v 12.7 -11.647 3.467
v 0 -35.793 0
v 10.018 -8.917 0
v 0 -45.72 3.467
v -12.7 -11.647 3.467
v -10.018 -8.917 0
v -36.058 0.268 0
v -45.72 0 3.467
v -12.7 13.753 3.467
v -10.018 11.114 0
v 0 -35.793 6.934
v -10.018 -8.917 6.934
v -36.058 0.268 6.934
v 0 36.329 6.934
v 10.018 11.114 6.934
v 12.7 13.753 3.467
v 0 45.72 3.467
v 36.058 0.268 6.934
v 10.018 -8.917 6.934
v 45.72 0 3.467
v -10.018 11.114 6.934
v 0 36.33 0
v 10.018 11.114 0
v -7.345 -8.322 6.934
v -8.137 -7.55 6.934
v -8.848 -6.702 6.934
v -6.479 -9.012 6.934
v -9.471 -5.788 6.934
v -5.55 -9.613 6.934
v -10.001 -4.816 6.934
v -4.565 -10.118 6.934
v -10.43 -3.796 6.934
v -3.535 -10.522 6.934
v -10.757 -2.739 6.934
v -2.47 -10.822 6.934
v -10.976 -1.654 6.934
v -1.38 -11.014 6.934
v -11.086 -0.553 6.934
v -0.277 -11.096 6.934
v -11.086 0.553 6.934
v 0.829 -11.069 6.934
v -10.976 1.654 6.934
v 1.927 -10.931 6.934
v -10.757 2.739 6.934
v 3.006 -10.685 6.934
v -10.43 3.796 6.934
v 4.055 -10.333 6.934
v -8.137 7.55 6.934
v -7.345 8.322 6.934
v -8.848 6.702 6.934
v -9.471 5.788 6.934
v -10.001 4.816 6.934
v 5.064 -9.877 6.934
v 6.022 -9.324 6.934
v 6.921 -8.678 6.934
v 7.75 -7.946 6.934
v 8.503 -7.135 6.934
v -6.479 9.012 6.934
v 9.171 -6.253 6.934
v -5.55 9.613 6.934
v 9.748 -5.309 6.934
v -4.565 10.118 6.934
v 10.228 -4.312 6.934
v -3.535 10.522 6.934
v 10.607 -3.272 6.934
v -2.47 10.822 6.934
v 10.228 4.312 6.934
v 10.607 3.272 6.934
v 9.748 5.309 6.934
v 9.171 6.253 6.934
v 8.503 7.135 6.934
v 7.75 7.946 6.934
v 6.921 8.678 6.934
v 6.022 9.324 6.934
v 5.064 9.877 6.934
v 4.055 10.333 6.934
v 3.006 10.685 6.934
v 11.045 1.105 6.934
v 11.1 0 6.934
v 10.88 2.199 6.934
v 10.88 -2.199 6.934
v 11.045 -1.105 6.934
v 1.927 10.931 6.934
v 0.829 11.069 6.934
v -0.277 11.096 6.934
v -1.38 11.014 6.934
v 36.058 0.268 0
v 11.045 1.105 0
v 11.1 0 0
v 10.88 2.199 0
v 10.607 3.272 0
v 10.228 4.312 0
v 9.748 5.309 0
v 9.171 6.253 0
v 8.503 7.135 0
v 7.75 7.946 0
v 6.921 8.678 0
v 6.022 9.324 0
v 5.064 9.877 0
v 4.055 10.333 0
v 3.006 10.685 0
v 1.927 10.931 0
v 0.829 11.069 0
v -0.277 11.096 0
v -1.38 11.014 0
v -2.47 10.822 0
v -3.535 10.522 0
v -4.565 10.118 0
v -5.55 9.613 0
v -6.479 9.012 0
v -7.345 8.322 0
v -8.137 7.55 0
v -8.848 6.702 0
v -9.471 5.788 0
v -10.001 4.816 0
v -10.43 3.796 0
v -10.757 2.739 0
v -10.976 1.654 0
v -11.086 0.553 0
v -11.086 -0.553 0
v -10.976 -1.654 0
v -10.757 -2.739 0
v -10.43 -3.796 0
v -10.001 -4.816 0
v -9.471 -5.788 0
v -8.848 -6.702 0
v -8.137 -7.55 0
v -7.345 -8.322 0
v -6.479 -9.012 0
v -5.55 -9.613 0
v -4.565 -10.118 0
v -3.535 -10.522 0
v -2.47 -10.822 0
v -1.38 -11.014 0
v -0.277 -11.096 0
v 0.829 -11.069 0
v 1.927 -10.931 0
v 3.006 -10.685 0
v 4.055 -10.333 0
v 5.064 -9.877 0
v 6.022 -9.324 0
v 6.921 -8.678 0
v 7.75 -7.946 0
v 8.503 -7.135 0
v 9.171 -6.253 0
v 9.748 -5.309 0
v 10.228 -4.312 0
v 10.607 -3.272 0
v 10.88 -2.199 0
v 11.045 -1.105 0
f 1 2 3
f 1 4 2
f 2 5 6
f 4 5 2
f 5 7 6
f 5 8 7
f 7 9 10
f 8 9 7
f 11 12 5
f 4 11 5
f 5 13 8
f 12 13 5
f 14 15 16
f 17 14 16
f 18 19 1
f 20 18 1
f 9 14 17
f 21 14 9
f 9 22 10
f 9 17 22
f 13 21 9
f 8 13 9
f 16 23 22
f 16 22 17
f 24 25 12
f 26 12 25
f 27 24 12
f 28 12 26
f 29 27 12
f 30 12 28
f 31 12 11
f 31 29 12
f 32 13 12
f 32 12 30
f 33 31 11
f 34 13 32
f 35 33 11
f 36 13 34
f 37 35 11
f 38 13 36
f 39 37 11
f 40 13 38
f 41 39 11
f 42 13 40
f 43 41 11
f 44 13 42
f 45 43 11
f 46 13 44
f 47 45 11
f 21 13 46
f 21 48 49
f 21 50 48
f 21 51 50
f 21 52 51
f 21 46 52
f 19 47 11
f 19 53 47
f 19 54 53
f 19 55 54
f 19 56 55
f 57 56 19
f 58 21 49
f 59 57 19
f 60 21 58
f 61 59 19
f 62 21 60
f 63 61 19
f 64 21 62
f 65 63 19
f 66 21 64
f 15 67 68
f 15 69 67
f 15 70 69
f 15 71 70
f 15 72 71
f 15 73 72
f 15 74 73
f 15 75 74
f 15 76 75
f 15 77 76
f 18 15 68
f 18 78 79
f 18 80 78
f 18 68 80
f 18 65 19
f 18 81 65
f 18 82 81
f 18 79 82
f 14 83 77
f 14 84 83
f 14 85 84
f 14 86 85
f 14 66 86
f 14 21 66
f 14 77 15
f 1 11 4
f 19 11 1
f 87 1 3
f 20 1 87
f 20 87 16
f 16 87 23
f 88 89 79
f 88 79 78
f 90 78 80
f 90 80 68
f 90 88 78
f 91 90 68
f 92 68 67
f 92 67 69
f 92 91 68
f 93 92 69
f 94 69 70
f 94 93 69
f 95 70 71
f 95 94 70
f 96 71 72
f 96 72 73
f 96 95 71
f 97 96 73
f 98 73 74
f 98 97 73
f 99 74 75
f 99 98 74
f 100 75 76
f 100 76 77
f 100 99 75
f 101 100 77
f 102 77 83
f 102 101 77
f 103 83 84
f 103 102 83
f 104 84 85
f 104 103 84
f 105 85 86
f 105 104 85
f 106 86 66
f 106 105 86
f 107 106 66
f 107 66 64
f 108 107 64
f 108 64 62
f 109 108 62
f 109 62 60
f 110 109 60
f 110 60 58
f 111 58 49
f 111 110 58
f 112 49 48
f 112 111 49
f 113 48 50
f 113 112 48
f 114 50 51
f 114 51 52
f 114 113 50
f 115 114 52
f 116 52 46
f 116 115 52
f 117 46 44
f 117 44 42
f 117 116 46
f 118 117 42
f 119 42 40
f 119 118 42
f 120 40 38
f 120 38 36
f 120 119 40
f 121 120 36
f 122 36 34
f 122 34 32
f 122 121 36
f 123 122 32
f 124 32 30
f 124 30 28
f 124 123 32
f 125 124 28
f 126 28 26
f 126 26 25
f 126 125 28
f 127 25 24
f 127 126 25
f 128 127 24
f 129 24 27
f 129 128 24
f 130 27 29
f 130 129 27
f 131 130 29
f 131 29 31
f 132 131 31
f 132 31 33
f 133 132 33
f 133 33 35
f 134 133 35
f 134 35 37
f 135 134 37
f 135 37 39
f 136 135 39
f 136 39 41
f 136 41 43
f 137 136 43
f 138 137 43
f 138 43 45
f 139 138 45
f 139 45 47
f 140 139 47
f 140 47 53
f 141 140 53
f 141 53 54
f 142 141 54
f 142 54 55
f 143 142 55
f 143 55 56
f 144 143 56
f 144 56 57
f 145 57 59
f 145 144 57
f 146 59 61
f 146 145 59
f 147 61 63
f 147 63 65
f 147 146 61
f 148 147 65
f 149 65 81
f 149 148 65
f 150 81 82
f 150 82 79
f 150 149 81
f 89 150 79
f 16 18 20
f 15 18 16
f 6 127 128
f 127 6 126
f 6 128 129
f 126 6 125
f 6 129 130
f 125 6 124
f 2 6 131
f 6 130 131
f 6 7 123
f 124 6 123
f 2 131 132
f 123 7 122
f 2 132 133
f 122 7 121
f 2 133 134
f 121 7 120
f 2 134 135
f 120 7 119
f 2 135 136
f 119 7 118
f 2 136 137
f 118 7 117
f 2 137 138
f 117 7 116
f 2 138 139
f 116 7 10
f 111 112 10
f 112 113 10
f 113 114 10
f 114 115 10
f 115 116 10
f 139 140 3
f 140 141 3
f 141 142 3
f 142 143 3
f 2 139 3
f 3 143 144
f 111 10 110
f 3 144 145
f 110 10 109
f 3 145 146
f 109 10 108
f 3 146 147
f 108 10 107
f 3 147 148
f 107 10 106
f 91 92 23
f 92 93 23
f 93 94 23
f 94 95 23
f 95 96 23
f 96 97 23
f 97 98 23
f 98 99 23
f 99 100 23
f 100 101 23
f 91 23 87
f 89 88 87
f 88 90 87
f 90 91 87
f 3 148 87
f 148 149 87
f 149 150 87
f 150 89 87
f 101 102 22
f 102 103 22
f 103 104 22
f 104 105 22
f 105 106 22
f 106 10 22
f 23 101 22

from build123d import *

# Parameters (mm, degrees)
F0_R     = 11.0998
F1_DEPTH = 6.9342
F2_SIZE  = 3.4671
F3_SIZE  = 3.46709


# Not quite as in the source:
# - a fillet or chamfer is up to 0.001 mm smaller than in the source, because OpenCascade refuses the exact size


with BuildPart() as f1:
    # F0 (on Top) → F1 (new body)
    with BuildSketch(Plane.XY):
        Polygon((12.7, 13.7528510513), (0, 45.72), (-12.7, 13.7528510513), (-45.72, 0), (-12.7, -11.6471489487), (0, -45.72), (12.7, -11.6471489487), (45.72, 0), align=None)
        Circle(F0_R, mode=Mode.SUBTRACT)
    extrude(amount=F1_DEPTH)

    # F2
    f2_edges = [f1.edges().sort_by_distance(p)[0] for p in [
        (6.35, -28.683574, 6.9342),
        (29.21, -5.823574, 6.9342),
        (-29.21, -5.823574, 6.9342),
        (-6.35, 29.736426, 6.9342),
        (-29.21, 6.876426, 6.9342),
        (6.35, 29.736426, 6.9342),
        (29.21, 6.876426, 6.9342),
        (-6.35, -28.683574, 6.9342),
    ]]
    chamfer(f2_edges, length=F2_SIZE)

    # F3 (size 3.4671 in the source; OpenCascade refuses exactly that, so slightly less here)
    f3_edges = [f1.edges().sort_by_distance(p)[0] for p in [
        (6.35, -28.683574, 0),
        (29.21, -5.823574, 0),
        (-29.21, -5.823574, 0),
        (-6.35, -28.683574, 0),
        (6.35, 29.736426, 0),
        (29.21, 6.876426, 0),
        (-29.21, 6.876426, 0),
        (-6.35, 29.736426, 0),
    ]]
    chamfer(f3_edges, length=F3_SIZE)


solid = f1.part
